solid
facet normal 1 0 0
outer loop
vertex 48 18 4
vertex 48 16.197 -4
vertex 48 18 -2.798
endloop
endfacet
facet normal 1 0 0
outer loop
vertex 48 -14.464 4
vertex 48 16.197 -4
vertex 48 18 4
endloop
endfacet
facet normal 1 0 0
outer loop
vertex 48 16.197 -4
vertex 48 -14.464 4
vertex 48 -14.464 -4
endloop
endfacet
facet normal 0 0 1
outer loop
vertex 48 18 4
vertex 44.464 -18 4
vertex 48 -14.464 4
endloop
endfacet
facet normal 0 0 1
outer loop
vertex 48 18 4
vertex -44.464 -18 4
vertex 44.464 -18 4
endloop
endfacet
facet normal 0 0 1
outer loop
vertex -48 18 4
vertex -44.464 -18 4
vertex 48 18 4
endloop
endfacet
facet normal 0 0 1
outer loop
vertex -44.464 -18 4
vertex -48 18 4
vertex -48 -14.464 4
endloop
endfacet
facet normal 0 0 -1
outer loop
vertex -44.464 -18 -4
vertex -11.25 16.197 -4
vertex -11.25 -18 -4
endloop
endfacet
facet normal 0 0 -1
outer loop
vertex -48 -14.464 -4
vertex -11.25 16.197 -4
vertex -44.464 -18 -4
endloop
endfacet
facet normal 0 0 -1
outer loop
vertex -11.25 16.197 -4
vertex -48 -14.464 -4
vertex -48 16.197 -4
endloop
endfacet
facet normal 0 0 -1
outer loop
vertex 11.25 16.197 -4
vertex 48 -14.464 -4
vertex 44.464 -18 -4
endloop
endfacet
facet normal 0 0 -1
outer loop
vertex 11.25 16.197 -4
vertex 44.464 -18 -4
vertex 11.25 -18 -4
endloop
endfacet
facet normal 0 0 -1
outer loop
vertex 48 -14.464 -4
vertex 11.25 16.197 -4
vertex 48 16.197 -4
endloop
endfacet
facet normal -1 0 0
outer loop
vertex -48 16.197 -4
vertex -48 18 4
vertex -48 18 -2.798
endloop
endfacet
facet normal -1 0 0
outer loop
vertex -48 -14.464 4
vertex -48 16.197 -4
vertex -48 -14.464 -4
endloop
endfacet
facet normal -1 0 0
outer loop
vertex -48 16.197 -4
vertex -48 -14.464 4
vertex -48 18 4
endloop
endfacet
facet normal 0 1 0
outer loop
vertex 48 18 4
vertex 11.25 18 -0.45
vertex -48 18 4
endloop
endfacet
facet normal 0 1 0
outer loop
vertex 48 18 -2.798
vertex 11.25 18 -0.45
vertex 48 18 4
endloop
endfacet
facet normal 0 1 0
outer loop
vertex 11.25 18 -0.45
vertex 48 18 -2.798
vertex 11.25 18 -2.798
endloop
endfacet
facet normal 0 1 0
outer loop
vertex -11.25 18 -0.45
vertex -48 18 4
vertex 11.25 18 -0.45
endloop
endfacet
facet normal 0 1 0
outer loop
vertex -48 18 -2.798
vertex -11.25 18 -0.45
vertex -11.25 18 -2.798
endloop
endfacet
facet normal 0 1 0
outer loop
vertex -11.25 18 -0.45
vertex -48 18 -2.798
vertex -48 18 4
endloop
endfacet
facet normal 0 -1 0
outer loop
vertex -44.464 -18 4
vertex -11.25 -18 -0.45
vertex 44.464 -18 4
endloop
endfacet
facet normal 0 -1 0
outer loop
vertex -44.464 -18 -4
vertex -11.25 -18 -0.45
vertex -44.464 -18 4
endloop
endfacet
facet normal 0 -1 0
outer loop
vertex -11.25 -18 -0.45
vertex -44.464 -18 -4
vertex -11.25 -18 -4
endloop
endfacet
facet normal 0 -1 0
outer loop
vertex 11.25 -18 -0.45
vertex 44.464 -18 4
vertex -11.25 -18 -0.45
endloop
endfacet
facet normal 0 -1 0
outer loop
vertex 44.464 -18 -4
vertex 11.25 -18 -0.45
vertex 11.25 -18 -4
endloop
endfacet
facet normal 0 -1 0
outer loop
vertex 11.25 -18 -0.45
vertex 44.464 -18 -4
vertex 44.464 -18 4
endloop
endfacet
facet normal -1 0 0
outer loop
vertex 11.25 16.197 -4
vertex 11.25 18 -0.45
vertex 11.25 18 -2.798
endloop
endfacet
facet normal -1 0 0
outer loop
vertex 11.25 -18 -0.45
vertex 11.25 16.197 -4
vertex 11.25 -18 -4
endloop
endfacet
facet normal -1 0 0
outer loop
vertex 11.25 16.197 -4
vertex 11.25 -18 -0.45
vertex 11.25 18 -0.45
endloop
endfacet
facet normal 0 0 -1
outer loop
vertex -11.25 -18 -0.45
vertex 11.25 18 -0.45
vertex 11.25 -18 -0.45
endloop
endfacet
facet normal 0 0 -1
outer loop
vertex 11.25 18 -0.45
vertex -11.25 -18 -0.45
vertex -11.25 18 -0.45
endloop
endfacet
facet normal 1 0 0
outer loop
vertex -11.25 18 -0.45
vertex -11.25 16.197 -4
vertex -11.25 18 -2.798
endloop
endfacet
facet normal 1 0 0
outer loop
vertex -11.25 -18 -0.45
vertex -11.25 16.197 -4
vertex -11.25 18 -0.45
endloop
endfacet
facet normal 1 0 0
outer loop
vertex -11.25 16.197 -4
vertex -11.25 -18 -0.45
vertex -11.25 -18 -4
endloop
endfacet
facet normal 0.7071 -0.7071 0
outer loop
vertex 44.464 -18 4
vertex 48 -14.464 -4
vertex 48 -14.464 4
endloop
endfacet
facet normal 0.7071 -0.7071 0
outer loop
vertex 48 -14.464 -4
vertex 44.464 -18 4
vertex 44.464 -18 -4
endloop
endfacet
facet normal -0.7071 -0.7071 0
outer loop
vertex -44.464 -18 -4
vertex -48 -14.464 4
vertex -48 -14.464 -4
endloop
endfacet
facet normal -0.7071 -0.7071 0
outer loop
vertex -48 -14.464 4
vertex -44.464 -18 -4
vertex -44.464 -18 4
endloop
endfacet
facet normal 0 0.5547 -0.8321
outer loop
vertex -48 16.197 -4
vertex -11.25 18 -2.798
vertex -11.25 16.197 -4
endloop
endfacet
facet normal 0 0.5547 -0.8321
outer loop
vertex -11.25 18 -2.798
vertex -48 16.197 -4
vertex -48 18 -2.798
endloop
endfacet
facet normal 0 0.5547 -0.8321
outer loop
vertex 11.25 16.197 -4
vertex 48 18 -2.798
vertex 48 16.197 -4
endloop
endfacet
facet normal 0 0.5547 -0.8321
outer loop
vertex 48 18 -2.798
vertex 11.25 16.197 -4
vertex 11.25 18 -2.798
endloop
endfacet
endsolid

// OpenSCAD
// Outer dimensions of charger shell
w_shell = 96;
d_shell = 36;
h_shell = 8;

// Bottom center dimple width and cut-out height
w_dimple = 22.5;
h_dimple = h_shell - 4.5;

// e = epsilon fudge factor to add to cut-outs for smoother rendering
e = 0.1;
e2 = e * 2;

// Shortcuts for centered cube and translated, centered cube
module c(x, y, z) { cube(size = [x, y, z], center = true); }
module tc(dx, dy, dz, x, y, z) { translate([dx, dy, dz]) c(x, y, z); }

difference() {
  c(w_shell, d_shell, h_shell);
  {
    // Bottom center dimple
    tc(0, 0, (h_dimple - h_shell) / 2, w_dimple, d_shell + e2, h_dimple + e);

    // Outer front vertical bevels
    translate([w_shell / 2, -d_shell / 2, 0])
      rotate([0, 0, 45])
      c(5, 5, h_shell + e2);
    translate([-w_shell / 2, -d_shell / 2, 0])
      rotate([0, 0, 45])
      c(5, 5, h_shell + e2);

    // Bottom rear horizontal bezel
    translate([0, d_shell / 2, -h_shell / 2])
      rotate([atan(6 / 9), 0, 0])
      c(w_shell + e2, 4, 2);
  }
}
